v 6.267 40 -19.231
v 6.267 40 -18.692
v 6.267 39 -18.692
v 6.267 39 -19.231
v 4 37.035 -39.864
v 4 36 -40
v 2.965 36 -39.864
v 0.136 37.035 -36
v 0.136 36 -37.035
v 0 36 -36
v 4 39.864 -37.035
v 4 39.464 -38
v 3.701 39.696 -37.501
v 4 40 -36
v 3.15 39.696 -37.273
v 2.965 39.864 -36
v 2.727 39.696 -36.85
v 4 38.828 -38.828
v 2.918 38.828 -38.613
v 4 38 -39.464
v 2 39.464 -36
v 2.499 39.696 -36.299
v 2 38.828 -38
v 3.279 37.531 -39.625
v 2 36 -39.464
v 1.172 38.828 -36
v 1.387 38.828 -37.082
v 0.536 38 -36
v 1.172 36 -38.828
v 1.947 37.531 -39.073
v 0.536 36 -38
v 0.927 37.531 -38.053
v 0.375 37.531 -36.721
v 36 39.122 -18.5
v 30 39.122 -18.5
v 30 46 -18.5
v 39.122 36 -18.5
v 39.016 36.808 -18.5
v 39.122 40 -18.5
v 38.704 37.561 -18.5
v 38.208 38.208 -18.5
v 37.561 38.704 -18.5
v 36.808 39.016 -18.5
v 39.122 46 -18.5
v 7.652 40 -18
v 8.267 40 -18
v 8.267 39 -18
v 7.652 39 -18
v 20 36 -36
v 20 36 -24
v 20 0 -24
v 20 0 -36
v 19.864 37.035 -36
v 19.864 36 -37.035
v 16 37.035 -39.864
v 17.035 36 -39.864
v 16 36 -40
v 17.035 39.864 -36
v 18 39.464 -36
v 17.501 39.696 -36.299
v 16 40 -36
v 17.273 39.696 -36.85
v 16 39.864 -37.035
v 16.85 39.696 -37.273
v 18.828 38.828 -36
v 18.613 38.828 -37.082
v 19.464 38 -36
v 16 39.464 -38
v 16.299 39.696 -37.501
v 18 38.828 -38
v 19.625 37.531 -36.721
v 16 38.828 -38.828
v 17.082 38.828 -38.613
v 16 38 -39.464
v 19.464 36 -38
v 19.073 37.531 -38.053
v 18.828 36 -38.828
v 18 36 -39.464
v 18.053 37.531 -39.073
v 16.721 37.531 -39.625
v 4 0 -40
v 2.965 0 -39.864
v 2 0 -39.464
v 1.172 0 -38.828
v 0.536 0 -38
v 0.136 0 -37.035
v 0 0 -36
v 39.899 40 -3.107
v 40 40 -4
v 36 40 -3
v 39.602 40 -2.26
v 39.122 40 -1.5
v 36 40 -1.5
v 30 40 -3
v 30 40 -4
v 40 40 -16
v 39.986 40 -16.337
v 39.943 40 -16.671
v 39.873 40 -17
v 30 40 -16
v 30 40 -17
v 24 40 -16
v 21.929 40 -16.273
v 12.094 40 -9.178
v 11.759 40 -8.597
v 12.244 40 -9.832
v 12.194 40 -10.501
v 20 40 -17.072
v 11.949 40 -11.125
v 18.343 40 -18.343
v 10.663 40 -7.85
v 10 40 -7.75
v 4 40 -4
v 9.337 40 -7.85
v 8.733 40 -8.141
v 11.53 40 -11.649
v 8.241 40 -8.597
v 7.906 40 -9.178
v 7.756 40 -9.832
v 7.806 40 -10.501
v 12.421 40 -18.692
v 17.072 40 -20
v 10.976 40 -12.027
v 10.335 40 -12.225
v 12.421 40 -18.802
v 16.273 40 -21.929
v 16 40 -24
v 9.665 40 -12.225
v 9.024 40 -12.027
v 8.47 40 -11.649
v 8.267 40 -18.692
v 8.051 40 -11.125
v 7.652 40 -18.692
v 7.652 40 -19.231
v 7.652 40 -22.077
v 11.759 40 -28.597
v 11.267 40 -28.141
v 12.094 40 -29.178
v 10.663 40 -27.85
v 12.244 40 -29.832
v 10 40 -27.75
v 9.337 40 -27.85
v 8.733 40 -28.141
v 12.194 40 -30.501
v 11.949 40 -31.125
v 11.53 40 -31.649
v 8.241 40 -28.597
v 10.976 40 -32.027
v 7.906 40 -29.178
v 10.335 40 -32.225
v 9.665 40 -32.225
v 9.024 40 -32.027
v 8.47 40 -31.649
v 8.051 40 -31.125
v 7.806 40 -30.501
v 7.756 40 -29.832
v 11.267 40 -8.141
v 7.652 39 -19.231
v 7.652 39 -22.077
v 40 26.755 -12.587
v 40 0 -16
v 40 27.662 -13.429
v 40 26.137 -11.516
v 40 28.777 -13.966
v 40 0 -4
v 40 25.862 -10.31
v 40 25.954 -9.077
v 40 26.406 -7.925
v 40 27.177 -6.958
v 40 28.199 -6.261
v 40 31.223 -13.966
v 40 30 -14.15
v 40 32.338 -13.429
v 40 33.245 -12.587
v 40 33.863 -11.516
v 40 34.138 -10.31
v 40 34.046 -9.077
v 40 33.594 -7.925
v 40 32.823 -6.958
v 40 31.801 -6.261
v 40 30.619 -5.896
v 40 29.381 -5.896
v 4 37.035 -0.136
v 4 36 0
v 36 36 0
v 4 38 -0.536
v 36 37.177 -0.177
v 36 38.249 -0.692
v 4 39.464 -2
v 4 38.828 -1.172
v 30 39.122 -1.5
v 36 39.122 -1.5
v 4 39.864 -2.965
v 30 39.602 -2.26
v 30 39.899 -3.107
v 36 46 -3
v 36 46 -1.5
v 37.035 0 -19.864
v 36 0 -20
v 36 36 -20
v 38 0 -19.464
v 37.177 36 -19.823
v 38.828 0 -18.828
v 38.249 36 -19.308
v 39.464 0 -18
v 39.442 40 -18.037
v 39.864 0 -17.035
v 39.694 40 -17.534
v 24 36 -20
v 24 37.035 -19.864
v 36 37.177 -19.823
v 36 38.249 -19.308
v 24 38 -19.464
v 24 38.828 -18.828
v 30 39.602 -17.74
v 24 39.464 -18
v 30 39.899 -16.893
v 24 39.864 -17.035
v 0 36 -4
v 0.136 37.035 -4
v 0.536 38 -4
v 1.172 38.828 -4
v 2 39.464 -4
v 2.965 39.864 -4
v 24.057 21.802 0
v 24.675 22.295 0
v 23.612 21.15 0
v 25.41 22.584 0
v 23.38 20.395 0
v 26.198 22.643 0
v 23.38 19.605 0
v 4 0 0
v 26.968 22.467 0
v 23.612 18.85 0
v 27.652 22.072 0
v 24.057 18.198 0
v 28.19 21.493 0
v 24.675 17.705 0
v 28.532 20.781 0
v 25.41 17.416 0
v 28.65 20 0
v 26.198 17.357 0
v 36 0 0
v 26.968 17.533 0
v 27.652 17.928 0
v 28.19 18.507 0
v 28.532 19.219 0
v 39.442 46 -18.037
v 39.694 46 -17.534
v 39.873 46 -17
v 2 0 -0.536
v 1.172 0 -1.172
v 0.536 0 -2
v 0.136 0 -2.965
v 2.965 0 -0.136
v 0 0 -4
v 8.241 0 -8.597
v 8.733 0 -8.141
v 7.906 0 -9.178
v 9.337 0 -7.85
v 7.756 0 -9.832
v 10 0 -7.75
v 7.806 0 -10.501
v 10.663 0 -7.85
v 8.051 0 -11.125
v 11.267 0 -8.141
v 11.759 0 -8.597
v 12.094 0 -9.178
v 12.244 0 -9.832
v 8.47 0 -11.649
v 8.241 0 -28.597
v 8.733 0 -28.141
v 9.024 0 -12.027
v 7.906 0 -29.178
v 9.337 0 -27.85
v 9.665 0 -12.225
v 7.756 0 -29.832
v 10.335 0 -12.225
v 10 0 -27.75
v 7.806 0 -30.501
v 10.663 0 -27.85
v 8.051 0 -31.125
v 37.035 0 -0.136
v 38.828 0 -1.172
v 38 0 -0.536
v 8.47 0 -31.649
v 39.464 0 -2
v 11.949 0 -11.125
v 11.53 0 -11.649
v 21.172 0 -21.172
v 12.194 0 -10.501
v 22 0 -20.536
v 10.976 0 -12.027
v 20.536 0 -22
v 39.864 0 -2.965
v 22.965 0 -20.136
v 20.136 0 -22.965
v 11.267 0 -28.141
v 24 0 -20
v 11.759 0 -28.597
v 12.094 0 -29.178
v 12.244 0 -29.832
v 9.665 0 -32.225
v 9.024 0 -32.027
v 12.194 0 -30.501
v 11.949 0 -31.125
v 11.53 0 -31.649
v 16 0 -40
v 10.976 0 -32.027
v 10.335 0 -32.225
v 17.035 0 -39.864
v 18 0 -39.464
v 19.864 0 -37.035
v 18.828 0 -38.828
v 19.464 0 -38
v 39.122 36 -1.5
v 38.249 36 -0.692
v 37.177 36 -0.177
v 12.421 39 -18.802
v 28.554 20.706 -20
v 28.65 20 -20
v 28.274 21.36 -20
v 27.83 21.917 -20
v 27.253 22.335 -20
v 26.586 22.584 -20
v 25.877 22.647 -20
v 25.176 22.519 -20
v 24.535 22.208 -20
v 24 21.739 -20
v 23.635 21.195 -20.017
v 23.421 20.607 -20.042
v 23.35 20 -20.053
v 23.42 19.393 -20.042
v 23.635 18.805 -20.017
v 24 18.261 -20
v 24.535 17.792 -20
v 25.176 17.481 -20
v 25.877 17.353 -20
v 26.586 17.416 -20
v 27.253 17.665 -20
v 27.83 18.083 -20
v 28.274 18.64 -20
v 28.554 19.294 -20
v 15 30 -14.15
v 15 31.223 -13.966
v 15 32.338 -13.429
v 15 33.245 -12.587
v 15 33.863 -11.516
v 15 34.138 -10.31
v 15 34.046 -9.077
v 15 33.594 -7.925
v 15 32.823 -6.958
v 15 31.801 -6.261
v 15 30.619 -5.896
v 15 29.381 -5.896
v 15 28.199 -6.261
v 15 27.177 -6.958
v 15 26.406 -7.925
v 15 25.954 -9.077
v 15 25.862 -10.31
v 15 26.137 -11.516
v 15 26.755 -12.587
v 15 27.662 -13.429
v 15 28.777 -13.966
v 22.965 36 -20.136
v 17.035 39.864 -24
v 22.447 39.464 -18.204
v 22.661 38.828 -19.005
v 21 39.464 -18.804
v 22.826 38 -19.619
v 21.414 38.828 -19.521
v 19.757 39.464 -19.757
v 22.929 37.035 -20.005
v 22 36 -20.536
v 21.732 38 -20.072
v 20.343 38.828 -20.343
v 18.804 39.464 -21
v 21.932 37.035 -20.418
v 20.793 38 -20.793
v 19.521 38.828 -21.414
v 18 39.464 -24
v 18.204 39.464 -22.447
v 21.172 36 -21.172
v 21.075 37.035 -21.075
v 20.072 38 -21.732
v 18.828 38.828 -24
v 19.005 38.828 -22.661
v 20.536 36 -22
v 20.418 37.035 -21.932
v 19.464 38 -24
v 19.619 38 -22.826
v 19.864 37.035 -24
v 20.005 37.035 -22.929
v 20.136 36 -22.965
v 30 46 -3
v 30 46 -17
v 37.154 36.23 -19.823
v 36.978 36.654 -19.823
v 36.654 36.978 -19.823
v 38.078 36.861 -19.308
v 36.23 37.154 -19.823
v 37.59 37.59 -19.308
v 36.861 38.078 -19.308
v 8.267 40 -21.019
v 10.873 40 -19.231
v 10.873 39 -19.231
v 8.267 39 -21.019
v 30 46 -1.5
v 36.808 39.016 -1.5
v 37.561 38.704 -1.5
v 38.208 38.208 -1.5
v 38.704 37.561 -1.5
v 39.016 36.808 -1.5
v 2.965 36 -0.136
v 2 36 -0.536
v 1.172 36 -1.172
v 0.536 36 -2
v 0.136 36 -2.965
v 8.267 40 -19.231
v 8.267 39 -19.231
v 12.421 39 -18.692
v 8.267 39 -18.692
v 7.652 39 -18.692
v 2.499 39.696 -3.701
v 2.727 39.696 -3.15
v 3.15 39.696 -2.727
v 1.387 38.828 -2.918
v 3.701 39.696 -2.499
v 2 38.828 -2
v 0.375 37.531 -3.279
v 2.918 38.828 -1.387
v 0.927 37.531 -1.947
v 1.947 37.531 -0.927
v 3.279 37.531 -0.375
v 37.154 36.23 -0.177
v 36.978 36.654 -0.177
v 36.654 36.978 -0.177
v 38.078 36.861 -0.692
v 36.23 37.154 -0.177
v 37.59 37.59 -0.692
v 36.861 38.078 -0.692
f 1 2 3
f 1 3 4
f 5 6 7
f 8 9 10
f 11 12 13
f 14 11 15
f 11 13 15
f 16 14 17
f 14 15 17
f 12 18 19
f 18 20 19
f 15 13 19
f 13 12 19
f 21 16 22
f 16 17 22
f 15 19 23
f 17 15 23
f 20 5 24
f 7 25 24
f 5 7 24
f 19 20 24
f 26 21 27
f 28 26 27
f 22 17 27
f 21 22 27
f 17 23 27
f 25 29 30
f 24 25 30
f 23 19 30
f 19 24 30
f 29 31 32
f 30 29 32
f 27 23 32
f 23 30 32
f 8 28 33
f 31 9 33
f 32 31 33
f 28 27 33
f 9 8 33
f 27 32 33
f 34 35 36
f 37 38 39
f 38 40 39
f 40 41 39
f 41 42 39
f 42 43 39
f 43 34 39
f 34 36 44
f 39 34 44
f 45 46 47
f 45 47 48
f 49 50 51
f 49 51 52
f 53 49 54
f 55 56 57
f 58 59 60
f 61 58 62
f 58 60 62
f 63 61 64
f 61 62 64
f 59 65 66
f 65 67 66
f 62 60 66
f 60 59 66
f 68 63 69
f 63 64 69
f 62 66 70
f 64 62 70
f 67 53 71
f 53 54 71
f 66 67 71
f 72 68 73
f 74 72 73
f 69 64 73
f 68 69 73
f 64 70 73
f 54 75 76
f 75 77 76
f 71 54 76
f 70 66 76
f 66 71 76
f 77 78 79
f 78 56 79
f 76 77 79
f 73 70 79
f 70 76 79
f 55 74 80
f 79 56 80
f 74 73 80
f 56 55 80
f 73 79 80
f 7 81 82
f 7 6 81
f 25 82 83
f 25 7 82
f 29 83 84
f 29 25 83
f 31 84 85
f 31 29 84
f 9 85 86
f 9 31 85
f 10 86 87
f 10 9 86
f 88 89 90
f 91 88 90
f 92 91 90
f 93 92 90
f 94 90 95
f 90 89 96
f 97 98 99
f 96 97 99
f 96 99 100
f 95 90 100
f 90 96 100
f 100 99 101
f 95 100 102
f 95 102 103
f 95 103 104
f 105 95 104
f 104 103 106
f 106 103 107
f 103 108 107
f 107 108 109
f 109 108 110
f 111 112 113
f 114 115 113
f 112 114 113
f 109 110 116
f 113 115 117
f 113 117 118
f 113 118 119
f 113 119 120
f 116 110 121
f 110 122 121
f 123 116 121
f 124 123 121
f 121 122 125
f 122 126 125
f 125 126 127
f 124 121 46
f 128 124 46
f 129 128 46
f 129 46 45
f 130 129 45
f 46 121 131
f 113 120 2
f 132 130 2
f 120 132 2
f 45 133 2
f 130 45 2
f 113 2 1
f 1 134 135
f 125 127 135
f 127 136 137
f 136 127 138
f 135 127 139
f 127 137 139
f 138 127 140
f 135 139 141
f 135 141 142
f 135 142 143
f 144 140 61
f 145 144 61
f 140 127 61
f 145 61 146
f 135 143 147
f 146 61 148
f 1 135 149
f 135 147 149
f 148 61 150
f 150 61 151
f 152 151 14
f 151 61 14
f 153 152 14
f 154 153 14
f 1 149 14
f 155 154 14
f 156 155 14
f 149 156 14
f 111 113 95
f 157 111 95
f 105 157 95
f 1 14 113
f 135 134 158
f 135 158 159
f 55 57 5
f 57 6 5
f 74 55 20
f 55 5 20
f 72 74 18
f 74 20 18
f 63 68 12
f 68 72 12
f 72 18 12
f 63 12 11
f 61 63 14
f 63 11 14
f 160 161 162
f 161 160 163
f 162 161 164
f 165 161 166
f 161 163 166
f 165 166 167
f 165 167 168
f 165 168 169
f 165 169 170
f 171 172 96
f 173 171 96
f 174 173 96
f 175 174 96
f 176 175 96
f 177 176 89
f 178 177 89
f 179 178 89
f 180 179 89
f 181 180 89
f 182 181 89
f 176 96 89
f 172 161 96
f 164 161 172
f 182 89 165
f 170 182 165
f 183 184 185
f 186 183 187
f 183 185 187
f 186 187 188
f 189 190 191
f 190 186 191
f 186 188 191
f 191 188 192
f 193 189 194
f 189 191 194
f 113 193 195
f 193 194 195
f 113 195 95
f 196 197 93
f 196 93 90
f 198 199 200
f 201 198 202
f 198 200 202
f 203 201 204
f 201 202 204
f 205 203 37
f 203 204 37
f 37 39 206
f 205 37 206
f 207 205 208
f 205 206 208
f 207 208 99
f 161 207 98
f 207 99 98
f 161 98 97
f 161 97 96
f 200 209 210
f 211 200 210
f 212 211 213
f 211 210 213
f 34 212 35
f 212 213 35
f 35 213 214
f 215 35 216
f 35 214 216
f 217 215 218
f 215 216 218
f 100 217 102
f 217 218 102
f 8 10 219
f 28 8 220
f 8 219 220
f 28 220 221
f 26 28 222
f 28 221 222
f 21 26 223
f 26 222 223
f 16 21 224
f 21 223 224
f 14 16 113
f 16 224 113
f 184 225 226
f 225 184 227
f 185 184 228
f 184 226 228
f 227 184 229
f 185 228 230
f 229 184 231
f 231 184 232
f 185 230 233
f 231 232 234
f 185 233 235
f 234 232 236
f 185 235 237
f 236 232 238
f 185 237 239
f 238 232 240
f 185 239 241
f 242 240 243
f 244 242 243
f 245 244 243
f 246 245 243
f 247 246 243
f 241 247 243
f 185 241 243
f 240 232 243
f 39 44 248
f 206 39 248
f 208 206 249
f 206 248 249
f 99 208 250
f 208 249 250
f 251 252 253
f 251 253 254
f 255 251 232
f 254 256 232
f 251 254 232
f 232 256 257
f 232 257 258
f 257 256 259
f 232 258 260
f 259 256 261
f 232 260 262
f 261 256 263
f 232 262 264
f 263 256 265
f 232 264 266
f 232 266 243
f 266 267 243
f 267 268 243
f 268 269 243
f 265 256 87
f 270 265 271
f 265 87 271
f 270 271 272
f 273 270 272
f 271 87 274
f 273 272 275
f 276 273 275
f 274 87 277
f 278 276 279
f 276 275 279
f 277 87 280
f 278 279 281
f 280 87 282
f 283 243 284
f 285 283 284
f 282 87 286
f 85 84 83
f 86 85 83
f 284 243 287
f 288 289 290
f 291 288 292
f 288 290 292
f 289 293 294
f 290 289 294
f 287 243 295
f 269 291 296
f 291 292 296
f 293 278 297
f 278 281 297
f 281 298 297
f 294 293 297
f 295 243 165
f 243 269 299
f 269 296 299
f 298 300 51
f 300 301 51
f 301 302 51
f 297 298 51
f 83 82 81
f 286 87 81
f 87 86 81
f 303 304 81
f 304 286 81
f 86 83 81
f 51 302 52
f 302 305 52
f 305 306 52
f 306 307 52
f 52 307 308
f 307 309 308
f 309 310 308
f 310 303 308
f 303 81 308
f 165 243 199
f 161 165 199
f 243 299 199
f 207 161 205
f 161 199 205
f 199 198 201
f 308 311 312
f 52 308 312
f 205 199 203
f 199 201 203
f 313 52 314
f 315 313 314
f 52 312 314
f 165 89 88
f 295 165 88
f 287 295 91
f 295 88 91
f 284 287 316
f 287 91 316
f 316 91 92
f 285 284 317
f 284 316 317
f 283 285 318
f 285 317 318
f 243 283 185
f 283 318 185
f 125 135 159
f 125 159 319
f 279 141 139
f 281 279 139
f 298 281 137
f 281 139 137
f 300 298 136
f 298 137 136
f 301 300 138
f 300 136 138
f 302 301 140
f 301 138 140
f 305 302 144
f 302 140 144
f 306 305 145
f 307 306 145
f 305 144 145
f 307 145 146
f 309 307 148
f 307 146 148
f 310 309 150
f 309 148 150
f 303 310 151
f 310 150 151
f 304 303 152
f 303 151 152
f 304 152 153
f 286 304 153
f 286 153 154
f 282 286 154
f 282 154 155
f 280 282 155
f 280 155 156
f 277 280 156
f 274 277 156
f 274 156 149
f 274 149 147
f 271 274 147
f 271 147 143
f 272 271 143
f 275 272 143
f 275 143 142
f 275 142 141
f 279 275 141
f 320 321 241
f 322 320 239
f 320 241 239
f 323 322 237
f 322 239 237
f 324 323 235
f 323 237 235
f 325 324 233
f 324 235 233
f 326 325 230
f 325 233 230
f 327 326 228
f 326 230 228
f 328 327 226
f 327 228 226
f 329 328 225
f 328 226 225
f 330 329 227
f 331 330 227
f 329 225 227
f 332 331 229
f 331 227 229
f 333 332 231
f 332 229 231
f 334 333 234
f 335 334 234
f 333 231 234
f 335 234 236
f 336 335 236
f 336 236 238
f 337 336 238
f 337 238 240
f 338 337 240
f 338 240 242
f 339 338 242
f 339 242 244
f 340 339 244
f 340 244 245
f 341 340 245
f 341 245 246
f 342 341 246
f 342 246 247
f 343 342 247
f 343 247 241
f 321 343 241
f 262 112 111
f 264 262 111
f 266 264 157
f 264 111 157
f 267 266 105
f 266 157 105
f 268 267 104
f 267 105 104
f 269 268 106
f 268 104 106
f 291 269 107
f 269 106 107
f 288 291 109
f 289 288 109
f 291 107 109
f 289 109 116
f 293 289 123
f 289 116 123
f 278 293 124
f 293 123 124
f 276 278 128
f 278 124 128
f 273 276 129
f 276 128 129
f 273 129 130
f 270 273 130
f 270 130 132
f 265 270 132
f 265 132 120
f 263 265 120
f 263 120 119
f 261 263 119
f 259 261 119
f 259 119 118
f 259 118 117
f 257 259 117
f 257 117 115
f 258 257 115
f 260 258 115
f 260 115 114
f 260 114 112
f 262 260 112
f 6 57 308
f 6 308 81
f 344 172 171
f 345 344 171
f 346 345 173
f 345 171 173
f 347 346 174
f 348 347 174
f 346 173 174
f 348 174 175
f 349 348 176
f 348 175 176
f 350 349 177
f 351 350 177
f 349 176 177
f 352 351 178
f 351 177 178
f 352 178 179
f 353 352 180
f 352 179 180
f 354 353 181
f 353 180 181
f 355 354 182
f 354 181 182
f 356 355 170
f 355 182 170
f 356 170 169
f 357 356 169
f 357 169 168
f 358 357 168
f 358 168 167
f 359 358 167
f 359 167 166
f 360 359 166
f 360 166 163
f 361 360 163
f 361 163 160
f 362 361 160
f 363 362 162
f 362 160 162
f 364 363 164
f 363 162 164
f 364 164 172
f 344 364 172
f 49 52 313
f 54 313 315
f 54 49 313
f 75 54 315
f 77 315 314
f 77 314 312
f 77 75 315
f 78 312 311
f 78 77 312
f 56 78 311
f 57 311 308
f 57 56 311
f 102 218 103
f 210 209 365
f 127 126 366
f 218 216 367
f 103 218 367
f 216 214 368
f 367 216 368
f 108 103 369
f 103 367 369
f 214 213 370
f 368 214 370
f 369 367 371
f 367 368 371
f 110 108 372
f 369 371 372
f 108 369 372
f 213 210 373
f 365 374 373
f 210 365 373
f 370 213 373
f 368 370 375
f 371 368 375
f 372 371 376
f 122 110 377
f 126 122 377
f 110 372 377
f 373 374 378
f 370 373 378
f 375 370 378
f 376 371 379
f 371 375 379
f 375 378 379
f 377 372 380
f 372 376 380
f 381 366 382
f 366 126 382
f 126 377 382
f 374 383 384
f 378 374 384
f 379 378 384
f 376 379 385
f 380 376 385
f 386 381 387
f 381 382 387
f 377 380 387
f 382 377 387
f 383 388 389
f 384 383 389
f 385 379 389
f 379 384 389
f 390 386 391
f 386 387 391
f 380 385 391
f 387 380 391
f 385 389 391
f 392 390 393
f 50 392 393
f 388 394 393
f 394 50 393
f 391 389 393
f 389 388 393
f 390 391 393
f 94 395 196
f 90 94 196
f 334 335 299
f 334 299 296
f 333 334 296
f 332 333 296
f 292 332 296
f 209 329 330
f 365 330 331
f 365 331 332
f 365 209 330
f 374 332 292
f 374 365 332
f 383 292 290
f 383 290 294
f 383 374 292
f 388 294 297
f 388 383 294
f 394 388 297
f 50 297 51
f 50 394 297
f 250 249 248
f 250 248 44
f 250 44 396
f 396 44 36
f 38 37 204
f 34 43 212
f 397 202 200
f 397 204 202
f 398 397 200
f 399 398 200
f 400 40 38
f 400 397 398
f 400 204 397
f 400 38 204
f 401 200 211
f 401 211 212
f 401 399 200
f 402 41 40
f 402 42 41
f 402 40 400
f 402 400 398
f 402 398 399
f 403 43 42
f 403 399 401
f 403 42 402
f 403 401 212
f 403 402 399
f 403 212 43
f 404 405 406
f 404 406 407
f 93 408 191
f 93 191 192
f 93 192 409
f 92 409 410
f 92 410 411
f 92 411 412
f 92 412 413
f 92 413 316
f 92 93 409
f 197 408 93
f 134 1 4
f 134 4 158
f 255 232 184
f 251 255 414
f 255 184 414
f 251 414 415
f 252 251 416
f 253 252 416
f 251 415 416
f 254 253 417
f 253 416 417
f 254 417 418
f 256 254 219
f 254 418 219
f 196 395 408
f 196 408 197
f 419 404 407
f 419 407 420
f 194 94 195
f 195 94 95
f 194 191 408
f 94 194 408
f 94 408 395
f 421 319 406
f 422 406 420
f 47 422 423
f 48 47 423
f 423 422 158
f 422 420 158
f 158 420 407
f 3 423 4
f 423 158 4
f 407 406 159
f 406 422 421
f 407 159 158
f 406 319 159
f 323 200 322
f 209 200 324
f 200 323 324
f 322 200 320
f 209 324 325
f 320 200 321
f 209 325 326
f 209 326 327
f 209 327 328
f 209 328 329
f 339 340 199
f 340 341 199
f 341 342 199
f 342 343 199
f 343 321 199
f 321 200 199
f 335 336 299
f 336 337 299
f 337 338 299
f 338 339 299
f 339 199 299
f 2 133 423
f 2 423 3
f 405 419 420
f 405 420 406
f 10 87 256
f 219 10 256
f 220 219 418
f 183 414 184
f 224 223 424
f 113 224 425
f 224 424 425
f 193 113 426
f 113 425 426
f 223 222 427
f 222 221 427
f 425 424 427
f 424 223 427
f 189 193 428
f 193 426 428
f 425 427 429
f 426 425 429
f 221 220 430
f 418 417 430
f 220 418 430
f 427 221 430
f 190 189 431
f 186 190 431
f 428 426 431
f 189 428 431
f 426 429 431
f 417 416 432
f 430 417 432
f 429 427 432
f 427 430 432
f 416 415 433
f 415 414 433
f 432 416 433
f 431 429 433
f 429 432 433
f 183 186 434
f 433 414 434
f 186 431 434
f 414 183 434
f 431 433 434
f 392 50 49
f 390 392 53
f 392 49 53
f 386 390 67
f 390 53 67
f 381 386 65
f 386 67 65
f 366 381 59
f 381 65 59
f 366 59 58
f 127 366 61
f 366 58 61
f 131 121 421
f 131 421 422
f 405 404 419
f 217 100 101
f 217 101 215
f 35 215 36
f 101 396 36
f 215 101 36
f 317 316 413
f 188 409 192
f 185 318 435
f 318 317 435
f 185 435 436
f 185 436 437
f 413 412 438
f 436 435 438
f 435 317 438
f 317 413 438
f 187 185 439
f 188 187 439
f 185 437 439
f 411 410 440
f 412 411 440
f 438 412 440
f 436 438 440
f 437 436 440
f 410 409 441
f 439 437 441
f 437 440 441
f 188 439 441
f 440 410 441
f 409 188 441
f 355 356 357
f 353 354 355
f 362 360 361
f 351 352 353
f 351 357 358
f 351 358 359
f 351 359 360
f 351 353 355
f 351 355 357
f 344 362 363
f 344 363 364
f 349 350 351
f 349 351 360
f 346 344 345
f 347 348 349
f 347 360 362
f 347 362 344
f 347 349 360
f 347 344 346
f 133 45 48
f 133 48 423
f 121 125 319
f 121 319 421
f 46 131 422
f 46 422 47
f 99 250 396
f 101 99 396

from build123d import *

# Parameters (mm, degrees)
SALIENTE_EXTRUIR1_DEPTH = 40
REDONDEO3_R             = 4
CROQUIS4_R              = 2.25
CORTAR_EXTRUIR3_DEPTH   = 70.282032303
CROQUIS5_R              = 4.15
CORTAR_EXTRUIR4_DEPTH   = 25
CORTAR_EXTRUIR6_DEPTH   = 1
CROQUIS9_R              = 2.65
CORTAR_EXTRUIR7_DEPTH   = 24
SALIENTE_EXTRUIR2_DEPTH = 5
SALIENTE_EXTRUIR3_START = 6
CROQUIS12_W             = 6
CROQUIS12_H             = 1.5
SALIENTE_EXTRUIR3_DEPTH = 6


with BuildPart() as part:
    # Croquis1 → Saliente-Extruir1 (new body)
    with BuildSketch(Plane(origin=(0, 0, 0), x_dir=(1, 0, 0), z_dir=(0, 1, 0))):
        Polygon((0, 0), (40, 0), (40, 20), (20, 20), (20, 40), (0, 40), align=None)
    extrude(amount=SALIENTE_EXTRUIR1_DEPTH)

    # Redondeo3
    redondeo3_edges = [part.edges().sort_by_distance(p)[0] for p in [
        (40, 40, -10),
        (0, 20, -40),
        (20, 20, -40),
        (20, 20, -20),
        (40, 20, -20),
        (40, 20, 0),
        (0, 20, 0),
        (30, 40, -20),
        (20, 40, -30),
        (10, 40, -40),
        (0, 40, -20),
        (20, 40, 0),
    ]]
    fillet(redondeo3_edges, radius=REDONDEO3_R)

    # Croquis4 → Cortar-Extruir3 (cut, through all)
    with BuildSketch(Plane(origin=(0, 40, 0), x_dir=(1, 0, 0), z_dir=(0, 1, 0))):
        with Locations(Location((10, 30, 0), (0, 0, 270))):
            Circle(CROQUIS4_R)
        with Locations(Location((10, 10, 0), (0, 0, 270))):
            Circle(CROQUIS4_R)
    extrude(amount=-CORTAR_EXTRUIR3_DEPTH, mode=Mode.SUBTRACT)

    # Croquis5 → Cortar-Extruir4 (cut)
    with BuildSketch(Plane(origin=(40, 0, 0), x_dir=(0, 0, -1), z_dir=(1, 0, 0))):
        with Locations((10, 30)):
            Circle(CROQUIS5_R)
    extrude(amount=-CORTAR_EXTRUIR4_DEPTH, mode=Mode.SUBTRACT)

    # Croquis8 → Cortar-Extruir6 (cut)
    with BuildSketch(Plane(origin=(0, 40, 0), x_dir=(1, 0, 0), z_dir=(0, 1, 0))):
        Polygon((12.421293342, 18.801682692), (12.421293342, 18.692307692), (8.267447188, 18.692307692), (8.267447188, 18), (7.652062573, 18), (7.652062573, 18.692307692), (6.267447188, 18.692307692), (6.267447188, 19.230769231), (7.652062573, 19.230769231), (7.652062573, 22.076923077), align=None)
        Polygon((8.267447188, 19.230769231), (10.873216419, 19.230769231), (8.267447188, 21.019230769), align=None, mode=Mode.SUBTRACT)
    extrude(amount=-CORTAR_EXTRUIR6_DEPTH, mode=Mode.SUBTRACT)

    # Croquis9 → Cortar-Extruir7 (cut)
    with BuildSketch(Plane.XY):
        with Locations((26, 20)):
            Circle(CROQUIS9_R)
    extrude(amount=-CORTAR_EXTRUIR7_DEPTH, mode=Mode.SUBTRACT)

    # Croquis11 → Saliente-Extruir2 (add)
    with BuildSketch(Plane(origin=(0, 40, 0), x_dir=(1, 0, 0), z_dir=(0, 1, 0))):
        with BuildLine():
            Line((30, 18.5), (39.122498999, 18.5))
            ThreePointArc((39.122498999, 18.5), (39.774254628, 17.324764885), (40, 16))
            Line((40, 16), (40, 4))
            ThreePointArc((40, 4), (39.774254628, 2.675235115), (39.122498999, 1.5))
            Line((39.122498999, 1.5), (30, 1.5))
            Line((30, 1.5), (30, 18.5))
        make_face()
    extrude(amount=-SALIENTE_EXTRUIR2_DEPTH)

    # Croquis12 → Saliente-Extruir3 (add)
    with BuildSketch(Plane(origin=(0, 40, 0), x_dir=(1, 0, 0), z_dir=(0, 1, 0)).offset(SALIENTE_EXTRUIR3_START)):
        with Locations((33, 2.25)):
            Rectangle(CROQUIS12_W, CROQUIS12_H)
        with BuildLine():
            Line((30, 18.5), (39.122498999, 18.5))
            ThreePointArc((39.122498999, 18.5), (39.57724661, 17.789778391), (39.872983346, 17))
            Line((39.872983346, 17), (30, 17))
            Line((30, 17), (30, 18.5))
        make_face()
    extrude(amount=-SALIENTE_EXTRUIR3_DEPTH)


solid = part.part
